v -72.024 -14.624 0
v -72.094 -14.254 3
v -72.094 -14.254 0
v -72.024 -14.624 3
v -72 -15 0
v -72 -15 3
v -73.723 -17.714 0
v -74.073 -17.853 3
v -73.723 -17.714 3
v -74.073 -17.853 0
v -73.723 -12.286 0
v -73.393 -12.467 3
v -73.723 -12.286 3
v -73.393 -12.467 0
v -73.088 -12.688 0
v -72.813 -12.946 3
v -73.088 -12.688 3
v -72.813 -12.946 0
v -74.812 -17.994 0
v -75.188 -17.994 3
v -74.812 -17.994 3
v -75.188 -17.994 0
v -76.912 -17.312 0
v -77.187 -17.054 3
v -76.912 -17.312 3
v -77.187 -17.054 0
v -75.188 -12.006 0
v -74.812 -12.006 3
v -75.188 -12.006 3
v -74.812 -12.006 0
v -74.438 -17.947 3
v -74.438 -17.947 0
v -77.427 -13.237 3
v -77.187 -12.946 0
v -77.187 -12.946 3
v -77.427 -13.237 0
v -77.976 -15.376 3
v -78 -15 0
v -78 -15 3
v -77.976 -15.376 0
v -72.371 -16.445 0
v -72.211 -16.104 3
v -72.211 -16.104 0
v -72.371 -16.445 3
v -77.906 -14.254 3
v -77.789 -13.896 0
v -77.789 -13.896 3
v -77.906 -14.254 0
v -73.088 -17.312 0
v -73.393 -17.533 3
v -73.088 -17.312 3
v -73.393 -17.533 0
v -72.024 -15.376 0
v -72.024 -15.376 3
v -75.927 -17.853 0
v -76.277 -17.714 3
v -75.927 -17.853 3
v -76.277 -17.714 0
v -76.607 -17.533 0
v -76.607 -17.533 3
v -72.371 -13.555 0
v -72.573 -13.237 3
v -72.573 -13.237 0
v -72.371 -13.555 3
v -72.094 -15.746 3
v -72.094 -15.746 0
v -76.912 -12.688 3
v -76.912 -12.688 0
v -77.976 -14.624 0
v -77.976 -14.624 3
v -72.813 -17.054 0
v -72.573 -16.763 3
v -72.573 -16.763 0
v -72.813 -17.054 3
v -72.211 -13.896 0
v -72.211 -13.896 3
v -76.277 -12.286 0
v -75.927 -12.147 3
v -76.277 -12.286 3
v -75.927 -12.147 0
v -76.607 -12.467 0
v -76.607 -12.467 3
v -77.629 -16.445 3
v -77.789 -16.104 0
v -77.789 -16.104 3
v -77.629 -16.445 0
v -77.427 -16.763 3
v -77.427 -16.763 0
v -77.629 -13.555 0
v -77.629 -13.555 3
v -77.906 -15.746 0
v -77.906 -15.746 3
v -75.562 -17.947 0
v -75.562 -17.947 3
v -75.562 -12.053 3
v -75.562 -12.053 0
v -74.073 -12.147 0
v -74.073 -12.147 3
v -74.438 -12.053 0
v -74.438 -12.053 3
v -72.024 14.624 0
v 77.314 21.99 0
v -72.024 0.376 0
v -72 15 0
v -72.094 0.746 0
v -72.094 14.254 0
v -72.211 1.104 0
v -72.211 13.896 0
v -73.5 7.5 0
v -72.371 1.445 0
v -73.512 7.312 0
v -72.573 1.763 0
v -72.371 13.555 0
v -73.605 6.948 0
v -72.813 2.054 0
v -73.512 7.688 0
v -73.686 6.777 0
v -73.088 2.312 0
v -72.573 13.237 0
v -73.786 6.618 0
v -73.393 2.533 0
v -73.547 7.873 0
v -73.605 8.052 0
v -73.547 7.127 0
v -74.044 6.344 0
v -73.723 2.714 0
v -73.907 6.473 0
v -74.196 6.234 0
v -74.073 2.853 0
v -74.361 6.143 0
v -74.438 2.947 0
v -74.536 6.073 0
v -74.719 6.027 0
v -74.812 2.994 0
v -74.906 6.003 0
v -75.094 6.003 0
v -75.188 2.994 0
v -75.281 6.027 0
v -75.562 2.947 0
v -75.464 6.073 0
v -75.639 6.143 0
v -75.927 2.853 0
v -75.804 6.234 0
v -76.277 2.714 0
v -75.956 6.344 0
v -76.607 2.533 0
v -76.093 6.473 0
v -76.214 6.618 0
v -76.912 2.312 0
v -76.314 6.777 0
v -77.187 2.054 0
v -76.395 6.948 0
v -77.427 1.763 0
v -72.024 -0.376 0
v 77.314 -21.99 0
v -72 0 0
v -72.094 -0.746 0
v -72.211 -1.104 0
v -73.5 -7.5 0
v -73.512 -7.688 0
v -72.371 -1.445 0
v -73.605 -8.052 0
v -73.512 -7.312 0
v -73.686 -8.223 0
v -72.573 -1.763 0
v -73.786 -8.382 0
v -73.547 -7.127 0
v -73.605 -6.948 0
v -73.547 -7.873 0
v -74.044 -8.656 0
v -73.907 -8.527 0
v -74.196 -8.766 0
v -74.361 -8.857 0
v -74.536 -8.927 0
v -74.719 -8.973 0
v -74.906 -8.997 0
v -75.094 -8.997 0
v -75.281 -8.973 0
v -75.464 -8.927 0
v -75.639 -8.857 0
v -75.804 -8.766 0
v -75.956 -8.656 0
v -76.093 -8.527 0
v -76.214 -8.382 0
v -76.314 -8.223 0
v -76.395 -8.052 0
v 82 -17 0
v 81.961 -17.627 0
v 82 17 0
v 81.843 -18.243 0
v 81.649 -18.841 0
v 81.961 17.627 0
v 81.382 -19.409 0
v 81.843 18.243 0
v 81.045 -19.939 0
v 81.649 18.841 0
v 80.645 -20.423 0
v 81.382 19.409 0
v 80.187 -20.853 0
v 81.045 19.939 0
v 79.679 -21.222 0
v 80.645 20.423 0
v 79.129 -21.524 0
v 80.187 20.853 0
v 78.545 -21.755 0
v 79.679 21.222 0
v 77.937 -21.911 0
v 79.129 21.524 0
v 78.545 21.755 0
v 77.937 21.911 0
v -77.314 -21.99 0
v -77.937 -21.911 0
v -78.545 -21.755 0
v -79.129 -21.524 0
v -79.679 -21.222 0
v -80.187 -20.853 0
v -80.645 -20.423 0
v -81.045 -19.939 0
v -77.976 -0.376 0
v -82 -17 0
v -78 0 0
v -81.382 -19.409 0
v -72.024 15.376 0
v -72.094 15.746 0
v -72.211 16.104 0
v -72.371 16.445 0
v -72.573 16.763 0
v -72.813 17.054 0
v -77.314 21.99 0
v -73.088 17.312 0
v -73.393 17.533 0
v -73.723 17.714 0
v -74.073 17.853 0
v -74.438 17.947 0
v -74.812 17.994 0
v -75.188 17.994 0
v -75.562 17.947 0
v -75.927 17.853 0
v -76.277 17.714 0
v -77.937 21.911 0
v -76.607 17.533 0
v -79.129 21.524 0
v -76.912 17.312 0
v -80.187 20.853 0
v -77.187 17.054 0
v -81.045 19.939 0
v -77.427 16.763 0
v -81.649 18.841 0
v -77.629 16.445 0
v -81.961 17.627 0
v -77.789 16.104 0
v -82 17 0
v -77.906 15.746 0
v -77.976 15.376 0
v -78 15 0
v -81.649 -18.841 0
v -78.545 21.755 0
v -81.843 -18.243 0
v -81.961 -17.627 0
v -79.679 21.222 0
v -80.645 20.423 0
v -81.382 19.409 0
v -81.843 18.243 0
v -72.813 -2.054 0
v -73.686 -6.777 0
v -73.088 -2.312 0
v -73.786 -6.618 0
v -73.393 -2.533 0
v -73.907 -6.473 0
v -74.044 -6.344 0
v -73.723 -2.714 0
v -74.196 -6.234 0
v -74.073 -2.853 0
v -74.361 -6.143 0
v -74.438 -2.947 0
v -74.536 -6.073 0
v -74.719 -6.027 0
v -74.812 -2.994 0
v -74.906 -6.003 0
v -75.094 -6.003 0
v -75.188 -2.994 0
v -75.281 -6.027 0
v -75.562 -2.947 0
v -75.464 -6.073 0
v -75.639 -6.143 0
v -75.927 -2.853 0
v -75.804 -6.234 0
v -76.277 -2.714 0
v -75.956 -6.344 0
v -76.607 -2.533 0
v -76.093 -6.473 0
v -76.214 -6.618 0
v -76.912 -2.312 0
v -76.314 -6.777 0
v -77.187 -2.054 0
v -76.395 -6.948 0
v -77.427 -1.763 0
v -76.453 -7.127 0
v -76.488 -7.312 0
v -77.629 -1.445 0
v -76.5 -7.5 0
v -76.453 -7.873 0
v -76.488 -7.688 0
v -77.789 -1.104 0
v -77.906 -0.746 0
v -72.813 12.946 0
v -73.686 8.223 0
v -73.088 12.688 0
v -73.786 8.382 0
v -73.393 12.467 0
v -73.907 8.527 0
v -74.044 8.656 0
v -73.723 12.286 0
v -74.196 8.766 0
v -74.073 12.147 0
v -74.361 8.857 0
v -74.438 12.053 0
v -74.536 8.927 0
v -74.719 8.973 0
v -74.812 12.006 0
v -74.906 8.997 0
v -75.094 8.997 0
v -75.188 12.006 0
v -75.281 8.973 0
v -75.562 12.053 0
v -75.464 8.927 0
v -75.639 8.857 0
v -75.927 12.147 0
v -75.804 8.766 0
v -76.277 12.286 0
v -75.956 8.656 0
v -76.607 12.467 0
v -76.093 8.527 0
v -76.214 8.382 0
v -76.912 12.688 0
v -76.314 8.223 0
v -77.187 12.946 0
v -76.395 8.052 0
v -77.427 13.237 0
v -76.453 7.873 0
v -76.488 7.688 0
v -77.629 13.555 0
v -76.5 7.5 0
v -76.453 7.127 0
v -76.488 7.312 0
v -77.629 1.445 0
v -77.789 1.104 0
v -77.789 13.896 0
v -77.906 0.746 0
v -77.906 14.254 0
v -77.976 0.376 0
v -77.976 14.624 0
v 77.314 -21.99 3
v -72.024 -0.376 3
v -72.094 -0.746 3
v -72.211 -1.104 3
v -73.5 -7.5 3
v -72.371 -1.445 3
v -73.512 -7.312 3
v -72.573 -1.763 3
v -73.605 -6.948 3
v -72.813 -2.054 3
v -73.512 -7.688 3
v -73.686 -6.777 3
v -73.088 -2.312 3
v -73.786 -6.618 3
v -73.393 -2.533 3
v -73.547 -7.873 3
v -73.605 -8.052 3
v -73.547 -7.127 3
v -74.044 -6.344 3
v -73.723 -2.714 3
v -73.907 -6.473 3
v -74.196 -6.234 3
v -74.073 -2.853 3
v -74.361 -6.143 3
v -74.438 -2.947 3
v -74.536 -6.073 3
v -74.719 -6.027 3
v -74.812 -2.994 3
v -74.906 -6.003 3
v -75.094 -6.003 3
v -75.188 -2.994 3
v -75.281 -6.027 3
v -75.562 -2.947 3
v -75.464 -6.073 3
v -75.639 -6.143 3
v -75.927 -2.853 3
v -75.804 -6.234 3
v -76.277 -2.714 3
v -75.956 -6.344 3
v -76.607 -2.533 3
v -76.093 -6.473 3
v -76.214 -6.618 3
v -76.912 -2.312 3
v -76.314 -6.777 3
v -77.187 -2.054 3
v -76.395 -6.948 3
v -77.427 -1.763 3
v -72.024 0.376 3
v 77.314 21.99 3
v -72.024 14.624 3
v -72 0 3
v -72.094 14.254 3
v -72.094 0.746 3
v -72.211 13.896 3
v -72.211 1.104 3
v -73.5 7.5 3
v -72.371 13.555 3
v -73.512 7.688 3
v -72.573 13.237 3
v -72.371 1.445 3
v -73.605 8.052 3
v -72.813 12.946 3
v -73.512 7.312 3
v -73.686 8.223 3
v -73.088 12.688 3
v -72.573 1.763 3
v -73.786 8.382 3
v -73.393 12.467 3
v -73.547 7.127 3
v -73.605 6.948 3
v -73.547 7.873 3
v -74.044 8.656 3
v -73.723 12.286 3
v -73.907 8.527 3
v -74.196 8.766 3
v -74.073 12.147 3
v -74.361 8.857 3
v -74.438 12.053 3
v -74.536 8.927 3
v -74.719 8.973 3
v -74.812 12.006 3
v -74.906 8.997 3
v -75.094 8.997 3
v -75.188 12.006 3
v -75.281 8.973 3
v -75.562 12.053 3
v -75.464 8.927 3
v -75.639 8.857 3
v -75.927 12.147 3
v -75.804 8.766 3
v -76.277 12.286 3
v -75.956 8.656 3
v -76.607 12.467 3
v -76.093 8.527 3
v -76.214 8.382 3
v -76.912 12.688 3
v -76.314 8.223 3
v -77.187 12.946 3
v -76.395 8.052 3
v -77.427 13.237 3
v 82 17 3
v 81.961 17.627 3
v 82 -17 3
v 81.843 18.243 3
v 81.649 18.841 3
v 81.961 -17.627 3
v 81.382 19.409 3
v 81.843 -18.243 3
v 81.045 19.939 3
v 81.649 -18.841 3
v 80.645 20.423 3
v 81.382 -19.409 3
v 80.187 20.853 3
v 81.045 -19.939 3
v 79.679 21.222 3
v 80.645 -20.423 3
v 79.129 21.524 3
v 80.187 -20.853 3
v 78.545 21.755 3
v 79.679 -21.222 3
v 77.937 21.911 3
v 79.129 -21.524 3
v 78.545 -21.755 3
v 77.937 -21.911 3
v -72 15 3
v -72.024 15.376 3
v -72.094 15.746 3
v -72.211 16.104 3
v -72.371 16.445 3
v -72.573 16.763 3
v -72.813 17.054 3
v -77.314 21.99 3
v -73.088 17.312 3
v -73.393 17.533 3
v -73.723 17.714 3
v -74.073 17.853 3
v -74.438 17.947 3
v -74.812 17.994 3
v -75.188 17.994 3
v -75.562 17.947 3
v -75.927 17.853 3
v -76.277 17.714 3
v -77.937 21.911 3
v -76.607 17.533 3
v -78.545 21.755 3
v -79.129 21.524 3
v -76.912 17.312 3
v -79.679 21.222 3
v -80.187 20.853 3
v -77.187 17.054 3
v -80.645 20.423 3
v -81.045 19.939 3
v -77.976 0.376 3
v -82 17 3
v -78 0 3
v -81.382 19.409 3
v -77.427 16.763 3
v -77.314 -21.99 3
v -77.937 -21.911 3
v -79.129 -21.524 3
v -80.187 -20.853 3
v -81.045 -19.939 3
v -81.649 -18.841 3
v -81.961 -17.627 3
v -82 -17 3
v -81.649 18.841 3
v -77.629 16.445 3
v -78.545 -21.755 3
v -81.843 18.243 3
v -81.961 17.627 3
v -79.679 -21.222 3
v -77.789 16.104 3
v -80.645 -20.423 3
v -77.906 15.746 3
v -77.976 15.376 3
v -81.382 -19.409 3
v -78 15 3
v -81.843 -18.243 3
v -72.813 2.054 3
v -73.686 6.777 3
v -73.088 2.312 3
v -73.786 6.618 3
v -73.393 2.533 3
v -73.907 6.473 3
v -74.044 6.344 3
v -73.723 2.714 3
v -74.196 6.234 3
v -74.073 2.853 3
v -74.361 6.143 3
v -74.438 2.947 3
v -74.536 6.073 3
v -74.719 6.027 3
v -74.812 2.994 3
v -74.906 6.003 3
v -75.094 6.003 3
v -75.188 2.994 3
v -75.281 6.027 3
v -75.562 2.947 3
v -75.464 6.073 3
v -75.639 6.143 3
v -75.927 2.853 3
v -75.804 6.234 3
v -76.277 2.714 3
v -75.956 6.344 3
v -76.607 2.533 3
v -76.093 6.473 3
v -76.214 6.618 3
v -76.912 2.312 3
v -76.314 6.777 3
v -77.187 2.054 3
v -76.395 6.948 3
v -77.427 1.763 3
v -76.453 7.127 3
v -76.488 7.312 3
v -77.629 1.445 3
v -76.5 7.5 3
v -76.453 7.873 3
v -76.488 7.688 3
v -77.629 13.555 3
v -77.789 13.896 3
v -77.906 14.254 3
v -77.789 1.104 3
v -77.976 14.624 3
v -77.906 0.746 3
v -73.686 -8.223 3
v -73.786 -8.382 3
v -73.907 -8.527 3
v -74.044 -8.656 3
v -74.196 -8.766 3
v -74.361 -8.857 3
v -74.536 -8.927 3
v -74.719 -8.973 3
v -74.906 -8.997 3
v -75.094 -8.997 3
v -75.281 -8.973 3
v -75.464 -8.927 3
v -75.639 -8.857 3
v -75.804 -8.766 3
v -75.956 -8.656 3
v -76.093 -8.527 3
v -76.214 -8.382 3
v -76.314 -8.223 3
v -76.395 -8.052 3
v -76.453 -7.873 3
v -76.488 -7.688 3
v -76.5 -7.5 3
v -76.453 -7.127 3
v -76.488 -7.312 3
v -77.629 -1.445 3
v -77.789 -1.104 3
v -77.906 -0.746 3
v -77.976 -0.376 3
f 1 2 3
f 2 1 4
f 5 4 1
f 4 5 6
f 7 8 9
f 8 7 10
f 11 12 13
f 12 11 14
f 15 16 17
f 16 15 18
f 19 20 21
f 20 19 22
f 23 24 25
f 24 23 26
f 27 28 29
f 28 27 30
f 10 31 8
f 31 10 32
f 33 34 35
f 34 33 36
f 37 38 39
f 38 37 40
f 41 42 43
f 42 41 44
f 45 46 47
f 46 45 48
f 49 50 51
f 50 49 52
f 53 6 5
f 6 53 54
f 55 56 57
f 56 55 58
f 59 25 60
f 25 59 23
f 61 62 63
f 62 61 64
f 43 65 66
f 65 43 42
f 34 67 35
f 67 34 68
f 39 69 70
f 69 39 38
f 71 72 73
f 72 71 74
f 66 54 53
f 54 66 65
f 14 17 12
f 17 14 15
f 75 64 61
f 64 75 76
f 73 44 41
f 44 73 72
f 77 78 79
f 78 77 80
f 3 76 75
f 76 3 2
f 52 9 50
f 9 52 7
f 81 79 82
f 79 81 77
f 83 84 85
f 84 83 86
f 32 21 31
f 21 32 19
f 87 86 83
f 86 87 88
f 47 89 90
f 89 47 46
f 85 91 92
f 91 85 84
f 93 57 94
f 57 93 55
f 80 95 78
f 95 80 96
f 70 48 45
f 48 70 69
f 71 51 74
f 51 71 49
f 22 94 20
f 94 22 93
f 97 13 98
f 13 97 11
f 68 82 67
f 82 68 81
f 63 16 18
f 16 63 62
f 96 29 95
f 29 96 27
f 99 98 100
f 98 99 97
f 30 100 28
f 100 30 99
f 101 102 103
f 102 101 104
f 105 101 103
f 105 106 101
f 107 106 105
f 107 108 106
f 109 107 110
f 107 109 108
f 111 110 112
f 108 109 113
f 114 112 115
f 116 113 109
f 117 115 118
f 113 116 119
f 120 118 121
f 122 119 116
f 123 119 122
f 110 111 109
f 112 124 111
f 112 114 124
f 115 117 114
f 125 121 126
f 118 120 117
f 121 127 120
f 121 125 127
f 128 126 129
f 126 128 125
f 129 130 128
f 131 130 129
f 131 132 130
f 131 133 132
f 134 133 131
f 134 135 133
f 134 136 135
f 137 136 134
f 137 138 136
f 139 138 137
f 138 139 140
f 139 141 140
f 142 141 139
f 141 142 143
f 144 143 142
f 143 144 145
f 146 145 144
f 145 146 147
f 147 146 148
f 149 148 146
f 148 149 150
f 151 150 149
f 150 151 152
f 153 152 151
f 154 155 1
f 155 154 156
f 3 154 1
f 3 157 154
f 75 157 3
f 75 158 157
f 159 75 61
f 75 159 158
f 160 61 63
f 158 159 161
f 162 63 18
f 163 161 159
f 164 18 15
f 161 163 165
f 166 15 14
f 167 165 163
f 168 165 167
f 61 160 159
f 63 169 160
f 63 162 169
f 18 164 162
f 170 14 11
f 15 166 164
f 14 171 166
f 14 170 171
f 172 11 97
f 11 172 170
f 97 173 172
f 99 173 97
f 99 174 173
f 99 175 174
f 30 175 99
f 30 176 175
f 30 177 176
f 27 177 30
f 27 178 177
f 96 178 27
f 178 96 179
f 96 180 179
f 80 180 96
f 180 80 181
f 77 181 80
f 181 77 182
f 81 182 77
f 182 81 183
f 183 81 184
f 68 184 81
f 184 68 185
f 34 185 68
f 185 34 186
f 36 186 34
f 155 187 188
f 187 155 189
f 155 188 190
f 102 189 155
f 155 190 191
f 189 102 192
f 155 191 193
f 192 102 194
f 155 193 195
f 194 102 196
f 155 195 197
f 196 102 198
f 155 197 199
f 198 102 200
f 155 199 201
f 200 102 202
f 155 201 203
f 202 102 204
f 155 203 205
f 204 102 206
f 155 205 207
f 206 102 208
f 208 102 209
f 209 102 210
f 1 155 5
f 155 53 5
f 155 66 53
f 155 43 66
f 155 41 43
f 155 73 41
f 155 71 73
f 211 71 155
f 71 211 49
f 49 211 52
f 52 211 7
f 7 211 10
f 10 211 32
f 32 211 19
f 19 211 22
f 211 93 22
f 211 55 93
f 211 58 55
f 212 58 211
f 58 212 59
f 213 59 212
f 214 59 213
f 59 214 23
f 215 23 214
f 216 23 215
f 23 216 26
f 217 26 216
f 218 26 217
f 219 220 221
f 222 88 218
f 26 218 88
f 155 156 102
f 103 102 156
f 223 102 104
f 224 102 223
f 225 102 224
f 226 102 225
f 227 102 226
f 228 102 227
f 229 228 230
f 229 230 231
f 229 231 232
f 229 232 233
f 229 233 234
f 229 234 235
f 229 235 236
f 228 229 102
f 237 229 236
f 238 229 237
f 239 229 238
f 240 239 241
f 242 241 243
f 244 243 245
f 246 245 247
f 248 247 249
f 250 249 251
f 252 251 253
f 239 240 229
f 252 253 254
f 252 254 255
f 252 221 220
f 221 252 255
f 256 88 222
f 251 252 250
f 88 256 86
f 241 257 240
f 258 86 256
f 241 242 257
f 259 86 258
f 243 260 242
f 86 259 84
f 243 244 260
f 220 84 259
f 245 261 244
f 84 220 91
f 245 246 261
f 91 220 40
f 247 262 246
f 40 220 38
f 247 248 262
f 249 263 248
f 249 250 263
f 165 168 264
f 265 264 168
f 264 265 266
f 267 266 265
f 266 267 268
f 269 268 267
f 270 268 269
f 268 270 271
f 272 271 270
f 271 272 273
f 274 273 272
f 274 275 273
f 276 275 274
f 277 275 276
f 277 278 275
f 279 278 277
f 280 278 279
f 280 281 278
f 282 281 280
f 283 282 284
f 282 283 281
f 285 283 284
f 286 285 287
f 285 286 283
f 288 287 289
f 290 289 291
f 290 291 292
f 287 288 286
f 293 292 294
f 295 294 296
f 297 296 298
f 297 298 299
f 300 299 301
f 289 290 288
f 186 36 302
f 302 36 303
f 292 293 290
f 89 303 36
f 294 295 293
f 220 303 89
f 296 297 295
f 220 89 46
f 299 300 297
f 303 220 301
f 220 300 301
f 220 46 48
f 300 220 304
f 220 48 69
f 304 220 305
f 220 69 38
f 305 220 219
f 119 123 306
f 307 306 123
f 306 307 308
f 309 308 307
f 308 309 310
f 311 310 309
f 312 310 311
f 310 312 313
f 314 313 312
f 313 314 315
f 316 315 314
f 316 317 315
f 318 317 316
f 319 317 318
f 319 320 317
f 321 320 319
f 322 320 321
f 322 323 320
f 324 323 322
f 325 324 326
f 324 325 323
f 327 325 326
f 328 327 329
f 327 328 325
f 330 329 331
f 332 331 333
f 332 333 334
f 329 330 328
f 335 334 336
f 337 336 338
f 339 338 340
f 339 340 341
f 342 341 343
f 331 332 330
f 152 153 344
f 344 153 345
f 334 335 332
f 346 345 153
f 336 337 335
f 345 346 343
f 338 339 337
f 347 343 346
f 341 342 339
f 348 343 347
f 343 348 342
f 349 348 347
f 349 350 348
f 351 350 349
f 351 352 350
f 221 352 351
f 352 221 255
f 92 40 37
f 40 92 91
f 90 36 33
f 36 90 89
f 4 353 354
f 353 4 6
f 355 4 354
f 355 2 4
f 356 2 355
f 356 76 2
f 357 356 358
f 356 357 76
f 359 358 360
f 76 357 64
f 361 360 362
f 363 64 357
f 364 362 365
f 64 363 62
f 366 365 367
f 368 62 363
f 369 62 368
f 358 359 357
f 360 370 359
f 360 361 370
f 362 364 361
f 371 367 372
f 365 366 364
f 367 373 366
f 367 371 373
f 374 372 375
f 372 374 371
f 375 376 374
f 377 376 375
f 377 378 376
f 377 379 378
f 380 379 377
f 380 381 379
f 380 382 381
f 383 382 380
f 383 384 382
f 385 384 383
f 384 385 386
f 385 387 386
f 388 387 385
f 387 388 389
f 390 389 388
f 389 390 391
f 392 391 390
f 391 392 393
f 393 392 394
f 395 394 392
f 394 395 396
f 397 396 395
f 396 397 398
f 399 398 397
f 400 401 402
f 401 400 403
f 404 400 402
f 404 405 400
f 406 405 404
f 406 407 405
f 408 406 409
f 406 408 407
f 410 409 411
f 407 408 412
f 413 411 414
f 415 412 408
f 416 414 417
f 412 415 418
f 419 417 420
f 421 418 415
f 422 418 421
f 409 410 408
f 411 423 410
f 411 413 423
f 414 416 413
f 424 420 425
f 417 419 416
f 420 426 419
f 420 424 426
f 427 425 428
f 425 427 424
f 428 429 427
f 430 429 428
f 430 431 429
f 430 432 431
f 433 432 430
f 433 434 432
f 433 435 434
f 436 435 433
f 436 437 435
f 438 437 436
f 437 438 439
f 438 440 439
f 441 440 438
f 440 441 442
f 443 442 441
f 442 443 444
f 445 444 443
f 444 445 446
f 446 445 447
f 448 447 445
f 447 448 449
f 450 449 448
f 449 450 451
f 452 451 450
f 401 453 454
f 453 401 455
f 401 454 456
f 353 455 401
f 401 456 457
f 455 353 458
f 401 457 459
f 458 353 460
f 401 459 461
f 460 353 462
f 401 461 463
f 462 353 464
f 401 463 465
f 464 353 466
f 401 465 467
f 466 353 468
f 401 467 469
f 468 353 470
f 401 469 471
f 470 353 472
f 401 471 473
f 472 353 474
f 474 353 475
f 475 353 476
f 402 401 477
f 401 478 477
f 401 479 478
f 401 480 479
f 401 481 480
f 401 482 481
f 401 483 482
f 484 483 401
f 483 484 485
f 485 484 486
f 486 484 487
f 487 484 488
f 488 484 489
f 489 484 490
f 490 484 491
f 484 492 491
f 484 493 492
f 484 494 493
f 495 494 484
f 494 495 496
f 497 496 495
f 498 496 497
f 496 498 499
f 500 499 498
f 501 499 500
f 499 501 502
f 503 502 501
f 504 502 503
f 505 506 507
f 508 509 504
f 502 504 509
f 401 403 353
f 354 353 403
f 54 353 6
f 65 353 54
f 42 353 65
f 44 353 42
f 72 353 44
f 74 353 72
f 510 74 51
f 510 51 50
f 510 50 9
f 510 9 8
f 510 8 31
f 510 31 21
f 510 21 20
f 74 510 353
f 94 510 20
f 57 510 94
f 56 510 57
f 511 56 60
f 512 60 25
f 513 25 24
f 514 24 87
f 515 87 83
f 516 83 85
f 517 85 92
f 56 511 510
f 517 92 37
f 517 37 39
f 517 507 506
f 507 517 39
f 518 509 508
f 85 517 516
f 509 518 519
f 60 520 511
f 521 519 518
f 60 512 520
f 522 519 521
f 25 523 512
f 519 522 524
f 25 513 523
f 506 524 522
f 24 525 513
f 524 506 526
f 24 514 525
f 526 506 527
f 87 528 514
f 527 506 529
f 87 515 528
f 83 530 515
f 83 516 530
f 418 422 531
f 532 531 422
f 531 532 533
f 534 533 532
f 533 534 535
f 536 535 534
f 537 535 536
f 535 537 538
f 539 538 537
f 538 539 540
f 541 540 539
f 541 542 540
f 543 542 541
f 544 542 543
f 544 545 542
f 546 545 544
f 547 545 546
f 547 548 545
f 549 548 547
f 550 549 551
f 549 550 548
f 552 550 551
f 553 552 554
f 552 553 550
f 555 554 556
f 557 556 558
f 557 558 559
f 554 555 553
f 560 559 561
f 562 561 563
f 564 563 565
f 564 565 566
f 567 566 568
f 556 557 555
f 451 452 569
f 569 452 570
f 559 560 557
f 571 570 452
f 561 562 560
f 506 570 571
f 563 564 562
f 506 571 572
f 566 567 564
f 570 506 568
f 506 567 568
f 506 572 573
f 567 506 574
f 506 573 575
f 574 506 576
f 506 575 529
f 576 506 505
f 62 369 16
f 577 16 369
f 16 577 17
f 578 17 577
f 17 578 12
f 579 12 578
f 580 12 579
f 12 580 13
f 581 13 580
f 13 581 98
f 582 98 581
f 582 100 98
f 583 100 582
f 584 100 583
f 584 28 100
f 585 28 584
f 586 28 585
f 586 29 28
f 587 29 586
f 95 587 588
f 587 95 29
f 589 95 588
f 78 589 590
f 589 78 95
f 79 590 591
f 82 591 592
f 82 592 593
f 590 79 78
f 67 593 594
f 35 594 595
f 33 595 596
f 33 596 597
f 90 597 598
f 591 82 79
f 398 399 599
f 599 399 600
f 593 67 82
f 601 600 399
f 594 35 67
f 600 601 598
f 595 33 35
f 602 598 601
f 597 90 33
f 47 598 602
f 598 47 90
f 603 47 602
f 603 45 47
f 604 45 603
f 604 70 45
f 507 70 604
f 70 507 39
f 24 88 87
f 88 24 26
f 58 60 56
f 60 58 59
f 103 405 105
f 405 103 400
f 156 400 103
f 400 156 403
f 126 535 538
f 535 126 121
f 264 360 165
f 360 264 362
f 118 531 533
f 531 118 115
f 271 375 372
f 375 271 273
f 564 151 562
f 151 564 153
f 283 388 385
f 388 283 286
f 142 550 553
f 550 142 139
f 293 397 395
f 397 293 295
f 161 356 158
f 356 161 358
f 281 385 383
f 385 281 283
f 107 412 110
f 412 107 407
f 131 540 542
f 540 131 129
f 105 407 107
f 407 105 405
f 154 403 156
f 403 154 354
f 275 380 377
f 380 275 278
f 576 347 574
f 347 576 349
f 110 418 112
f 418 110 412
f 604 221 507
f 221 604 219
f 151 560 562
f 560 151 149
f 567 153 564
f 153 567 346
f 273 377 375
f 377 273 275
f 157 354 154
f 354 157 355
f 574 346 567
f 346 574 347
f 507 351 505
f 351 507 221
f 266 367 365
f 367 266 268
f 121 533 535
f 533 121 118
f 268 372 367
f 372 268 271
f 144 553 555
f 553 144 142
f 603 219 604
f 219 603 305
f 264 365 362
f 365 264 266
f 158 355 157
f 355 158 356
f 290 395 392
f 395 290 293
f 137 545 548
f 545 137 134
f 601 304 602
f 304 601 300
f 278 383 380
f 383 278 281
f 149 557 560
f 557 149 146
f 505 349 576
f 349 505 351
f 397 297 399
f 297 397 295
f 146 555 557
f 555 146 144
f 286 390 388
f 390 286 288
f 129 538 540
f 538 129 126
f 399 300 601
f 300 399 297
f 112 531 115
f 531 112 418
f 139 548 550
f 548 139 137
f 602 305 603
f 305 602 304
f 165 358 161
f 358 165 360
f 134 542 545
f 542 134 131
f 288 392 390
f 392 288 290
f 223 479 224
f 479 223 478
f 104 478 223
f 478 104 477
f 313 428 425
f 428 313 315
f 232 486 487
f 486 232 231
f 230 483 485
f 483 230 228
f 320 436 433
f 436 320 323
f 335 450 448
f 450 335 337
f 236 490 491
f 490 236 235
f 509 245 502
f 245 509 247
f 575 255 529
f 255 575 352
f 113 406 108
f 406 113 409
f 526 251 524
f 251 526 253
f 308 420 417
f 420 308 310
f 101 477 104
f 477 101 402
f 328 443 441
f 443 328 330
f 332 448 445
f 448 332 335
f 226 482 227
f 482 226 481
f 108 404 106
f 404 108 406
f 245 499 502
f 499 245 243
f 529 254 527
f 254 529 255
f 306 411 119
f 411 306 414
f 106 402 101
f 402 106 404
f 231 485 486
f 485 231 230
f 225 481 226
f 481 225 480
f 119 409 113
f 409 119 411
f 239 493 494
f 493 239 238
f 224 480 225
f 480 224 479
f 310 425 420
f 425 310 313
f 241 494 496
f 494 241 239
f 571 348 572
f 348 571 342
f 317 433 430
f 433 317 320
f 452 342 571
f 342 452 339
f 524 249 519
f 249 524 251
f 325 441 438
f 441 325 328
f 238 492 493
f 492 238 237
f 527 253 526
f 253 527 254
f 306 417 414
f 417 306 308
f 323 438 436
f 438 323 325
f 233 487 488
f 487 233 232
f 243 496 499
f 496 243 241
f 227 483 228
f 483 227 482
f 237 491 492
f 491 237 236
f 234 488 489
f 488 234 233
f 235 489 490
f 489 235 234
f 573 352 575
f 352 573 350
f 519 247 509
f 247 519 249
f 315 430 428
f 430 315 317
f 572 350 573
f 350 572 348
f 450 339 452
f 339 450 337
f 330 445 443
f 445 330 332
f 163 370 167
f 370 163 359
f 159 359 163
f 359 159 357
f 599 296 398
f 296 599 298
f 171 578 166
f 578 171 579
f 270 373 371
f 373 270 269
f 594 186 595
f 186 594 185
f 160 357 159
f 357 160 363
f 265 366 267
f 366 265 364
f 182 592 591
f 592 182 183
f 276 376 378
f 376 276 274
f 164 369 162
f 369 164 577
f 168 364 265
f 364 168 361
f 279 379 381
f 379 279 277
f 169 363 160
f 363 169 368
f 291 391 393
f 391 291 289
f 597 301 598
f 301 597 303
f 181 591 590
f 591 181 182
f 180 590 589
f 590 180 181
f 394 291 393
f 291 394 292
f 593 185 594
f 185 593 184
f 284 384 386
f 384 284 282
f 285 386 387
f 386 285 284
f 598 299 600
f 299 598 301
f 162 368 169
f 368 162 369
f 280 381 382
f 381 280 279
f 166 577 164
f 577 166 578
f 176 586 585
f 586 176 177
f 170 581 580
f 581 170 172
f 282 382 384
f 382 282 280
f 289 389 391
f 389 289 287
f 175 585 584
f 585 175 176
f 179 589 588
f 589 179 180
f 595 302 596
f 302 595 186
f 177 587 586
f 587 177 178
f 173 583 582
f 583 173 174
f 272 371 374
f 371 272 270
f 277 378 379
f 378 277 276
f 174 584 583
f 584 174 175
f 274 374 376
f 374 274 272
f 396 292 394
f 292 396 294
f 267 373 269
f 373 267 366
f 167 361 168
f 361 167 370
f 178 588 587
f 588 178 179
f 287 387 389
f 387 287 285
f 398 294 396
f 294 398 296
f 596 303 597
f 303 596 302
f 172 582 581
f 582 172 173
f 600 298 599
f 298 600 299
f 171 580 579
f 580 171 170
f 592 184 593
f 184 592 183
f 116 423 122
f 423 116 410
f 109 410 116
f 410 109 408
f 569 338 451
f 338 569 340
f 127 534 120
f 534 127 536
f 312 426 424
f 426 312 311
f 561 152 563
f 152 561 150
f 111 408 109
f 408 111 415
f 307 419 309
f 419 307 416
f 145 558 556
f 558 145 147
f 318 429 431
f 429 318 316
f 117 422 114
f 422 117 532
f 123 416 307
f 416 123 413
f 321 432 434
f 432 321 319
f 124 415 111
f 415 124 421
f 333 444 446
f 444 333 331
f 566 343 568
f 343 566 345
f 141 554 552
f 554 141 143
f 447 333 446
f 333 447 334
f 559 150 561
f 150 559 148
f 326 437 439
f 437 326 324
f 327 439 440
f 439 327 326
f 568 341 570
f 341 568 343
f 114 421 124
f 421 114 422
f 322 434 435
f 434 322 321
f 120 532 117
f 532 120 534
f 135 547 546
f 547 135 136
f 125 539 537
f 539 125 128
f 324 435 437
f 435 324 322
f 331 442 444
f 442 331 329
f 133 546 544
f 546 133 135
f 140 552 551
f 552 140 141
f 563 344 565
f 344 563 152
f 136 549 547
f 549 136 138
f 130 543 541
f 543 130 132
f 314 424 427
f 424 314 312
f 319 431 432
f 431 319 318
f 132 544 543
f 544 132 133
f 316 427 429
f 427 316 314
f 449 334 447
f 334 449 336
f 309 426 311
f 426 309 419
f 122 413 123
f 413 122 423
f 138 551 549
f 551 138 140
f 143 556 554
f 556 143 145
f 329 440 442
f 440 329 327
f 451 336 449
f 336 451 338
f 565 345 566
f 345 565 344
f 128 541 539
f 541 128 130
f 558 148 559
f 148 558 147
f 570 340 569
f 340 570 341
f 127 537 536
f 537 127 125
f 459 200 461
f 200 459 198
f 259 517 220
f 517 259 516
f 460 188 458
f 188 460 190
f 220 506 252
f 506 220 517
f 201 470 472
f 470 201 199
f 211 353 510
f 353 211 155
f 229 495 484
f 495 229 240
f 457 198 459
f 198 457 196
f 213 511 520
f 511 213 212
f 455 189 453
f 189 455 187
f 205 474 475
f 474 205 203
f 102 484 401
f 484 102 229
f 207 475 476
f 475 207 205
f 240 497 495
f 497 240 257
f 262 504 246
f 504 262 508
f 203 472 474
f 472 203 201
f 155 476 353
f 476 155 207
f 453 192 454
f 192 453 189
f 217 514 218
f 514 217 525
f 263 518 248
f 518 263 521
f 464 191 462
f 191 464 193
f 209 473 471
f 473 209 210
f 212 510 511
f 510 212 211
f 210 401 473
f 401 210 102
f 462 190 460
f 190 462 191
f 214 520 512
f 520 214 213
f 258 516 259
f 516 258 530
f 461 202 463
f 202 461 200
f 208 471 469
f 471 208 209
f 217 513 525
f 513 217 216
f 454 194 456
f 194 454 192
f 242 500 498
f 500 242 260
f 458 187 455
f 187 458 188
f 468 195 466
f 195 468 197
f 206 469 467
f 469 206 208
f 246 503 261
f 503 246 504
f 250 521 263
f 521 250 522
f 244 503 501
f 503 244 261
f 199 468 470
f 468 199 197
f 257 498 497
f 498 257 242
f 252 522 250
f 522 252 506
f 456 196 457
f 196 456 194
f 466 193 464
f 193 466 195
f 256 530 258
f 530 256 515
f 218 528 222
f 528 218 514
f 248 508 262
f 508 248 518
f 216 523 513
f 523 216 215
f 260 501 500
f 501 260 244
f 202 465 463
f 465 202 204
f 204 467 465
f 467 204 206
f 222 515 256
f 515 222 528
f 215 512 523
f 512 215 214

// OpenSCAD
$fn = 50;


difference() {
	union() {
		hull() {
			translate(v = [-77.0000000000, 17.0000000000, 0]) {
				cylinder(h = 3, r = 5);
			}
			translate(v = [77.0000000000, 17.0000000000, 0]) {
				cylinder(h = 3, r = 5);
			}
			translate(v = [-77.0000000000, -17.0000000000, 0]) {
				cylinder(h = 3, r = 5);
			}
			translate(v = [77.0000000000, -17.0000000000, 0]) {
				cylinder(h = 3, r = 5);
			}
		}
	}
	union() {
		translate(v = [-75.0000000000, -15.0000000000, 0]) {
			cylinder(h = 3, r = 3.0000000000);
		}
		translate(v = [-75.0000000000, 0.0000000000, 0]) {
			cylinder(h = 3, r = 3.0000000000);
		}
		translate(v = [-75.0000000000, 15.0000000000, 0]) {
			cylinder(h = 3, r = 3.0000000000);
		}
		translate(v = [-75.0000000000, -15.0000000000, 0]) {
			cylinder(h = 3, r = 1.5000000000);
		}
		translate(v = [-75.0000000000, -7.5000000000, 0]) {
			cylinder(h = 3, r = 1.5000000000);
		}
		translate(v = [-75.0000000000, 0.0000000000, 0]) {
			cylinder(h = 3, r = 1.5000000000);
		}
		translate(v = [-75.0000000000, 7.5000000000, 0]) {
			cylinder(h = 3, r = 1.5000000000);
		}
		translate(v = [-75.0000000000, 15.0000000000, 0]) {
			cylinder(h = 3, r = 1.5000000000);
		}
		translate(v = [-75.0000000000, -15.0000000000, 0]) {
			cylinder(h = 3, r = 1.5000000000);
		}
		translate(v = [-75.0000000000, -7.5000000000, 0]) {
			cylinder(h = 3, r = 1.5000000000);
		}
		translate(v = [-75.0000000000, 0.0000000000, 0]) {
			cylinder(h = 3, r = 1.5000000000);
		}
		translate(v = [-75.0000000000, 7.5000000000, 0]) {
			cylinder(h = 3, r = 1.5000000000);
		}
		translate(v = [-75.0000000000, 15.0000000000, 0]) {
			cylinder(h = 3, r = 1.5000000000);
		}
		translate(v = [-75.0000000000, -15.0000000000, 0]) {
			cylinder(h = 3, r = 1.5000000000);
		}
		translate(v = [-75.0000000000, -7.5000000000, 0]) {
			cylinder(h = 3, r = 1.5000000000);
		}
		translate(v = [-75.0000000000, 0.0000000000, 0]) {
			cylinder(h = 3, r = 1.5000000000);
		}
		translate(v = [-75.0000000000, 7.5000000000, 0]) {
			cylinder(h = 3, r = 1.5000000000);
		}
		translate(v = [-75.0000000000, 15.0000000000, 0]) {
			cylinder(h = 3, r = 1.5000000000);
		}
	}
}
